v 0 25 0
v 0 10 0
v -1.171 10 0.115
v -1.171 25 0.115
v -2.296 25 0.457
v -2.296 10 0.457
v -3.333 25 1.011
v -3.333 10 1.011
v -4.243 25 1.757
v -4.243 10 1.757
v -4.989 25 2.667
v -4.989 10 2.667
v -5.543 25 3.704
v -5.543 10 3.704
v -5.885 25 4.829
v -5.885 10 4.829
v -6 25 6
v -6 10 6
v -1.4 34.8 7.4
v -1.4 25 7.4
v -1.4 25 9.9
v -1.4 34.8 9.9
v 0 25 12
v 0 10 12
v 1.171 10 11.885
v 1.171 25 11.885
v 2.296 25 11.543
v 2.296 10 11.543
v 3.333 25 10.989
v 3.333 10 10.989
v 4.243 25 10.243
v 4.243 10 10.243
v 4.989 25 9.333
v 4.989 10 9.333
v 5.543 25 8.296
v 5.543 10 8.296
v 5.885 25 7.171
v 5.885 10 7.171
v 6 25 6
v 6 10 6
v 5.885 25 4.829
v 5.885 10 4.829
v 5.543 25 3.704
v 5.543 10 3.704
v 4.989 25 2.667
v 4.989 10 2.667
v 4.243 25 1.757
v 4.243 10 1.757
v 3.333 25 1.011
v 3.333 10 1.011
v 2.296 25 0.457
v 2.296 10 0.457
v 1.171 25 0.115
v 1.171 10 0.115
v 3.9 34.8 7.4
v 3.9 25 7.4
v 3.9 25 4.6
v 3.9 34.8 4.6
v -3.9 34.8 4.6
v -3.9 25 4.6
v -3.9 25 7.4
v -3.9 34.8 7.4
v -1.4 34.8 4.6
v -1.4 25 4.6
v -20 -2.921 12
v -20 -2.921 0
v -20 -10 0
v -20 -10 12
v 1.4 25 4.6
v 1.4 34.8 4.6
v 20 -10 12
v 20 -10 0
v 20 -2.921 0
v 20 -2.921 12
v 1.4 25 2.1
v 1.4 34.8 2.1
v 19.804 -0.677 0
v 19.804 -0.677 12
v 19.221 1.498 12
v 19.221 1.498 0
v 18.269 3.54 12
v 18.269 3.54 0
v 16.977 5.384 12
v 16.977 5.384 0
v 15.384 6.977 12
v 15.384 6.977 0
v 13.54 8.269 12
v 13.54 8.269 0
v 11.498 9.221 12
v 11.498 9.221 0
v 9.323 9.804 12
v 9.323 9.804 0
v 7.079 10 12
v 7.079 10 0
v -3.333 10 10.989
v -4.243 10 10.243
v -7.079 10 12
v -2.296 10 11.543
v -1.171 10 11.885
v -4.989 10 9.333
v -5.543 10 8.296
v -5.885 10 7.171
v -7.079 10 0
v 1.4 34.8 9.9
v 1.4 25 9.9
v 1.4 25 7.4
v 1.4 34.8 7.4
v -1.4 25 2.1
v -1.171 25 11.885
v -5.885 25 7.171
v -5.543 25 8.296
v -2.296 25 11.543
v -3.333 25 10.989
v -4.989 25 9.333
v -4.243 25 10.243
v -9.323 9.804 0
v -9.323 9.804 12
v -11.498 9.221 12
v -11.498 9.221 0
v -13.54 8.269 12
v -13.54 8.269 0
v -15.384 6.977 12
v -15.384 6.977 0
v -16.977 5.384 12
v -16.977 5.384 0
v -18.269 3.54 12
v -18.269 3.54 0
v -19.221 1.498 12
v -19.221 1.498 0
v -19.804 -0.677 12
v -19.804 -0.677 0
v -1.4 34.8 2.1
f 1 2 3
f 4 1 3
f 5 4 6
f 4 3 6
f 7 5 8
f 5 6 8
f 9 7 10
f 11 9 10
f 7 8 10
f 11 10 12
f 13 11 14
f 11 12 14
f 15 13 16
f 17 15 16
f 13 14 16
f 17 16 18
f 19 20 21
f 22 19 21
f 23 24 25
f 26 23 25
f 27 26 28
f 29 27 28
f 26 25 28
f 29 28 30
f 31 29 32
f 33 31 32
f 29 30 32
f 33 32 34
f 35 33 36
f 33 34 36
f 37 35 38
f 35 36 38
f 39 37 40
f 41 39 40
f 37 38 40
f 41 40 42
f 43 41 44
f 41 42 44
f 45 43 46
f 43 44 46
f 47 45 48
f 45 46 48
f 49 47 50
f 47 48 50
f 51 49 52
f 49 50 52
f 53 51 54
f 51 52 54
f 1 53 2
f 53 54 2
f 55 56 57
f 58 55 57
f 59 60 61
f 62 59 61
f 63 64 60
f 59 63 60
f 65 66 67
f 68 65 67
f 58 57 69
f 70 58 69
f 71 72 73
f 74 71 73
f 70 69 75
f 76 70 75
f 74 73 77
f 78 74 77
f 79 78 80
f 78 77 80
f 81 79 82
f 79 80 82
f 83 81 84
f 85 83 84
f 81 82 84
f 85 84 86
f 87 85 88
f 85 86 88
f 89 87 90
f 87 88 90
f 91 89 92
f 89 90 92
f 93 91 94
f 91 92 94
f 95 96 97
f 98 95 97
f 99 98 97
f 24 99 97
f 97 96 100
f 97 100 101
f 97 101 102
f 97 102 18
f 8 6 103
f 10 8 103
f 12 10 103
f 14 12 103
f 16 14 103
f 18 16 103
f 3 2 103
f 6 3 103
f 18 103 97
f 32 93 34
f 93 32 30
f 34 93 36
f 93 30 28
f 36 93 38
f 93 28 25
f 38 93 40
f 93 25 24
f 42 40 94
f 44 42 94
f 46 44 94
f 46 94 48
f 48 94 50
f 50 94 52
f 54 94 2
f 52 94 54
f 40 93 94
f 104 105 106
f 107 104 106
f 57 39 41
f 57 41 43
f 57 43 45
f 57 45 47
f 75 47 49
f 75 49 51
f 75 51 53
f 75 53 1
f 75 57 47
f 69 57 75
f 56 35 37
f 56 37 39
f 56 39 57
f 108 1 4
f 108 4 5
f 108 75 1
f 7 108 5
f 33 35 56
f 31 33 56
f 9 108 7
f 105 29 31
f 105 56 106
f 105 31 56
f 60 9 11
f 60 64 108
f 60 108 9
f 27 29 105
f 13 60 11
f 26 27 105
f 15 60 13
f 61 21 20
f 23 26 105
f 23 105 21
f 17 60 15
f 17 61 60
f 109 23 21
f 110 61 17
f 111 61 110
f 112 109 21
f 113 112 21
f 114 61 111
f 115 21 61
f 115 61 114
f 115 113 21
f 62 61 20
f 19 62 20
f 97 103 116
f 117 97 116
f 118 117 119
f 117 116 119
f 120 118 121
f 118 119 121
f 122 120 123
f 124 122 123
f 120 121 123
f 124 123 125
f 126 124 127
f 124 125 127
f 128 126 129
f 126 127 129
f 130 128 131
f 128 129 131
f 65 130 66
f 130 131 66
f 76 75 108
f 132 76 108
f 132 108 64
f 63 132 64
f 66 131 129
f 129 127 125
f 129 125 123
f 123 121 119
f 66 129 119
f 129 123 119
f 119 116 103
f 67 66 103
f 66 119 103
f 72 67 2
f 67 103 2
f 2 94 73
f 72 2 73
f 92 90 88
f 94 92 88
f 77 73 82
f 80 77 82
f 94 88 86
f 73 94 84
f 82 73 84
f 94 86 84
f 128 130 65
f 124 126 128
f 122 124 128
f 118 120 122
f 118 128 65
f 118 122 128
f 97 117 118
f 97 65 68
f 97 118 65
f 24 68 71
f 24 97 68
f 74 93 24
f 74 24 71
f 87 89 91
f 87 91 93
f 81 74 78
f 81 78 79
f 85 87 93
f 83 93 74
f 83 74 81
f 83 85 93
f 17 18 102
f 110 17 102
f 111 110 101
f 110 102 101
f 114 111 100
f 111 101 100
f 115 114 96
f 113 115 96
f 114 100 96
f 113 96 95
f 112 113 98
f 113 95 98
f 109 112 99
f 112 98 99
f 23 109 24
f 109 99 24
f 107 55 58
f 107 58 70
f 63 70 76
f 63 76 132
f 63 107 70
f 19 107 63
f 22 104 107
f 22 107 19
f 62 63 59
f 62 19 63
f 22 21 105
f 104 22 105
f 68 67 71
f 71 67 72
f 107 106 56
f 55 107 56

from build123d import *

# Parameters (mm, degrees)
F1_DEPTH = 12
F3_DEPTH = 15
F5_DEPTH = 9.8


with BuildPart() as f1:
    # F0 (on Top) → F1 (new body)
    with BuildSketch(Plane.XY):
        with BuildLine():
            Line((-20, -10), (-7.079002, -10))
            Line((-7.079002, -10), (7.079002, -10))
            Line((7.079002, -10), (20, -10))
            Line((20, -10), (20, -2.920998))
            ThreePointArc((20, -2.920998), (16.215527, 6.215527), (7.079002, 10))
            Line((7.079002, 10), (-7.079002, 10))
            ThreePointArc((-7.079002, 10), (-16.215527, 6.215527), (-20, -2.920998))
            Line((-20, -2.920998), (-20, -10))
        make_face()
    extrude(amount=F1_DEPTH)

    # F2 (on face) → F3 (join)
    with BuildSketch(Plane(origin=(0, 10, 0), x_dir=(-1, 0, 0), z_dir=(0, 1, 0))):
        with BuildLine():
            ThreePointArc((0, 0), (4.242641, 1.757359), (6, 6))
            ThreePointArc((6, 6), (4.242641, 10.242641), (0, 12))
            ThreePointArc((0, 12), (-6, 6), (0, 0))
        make_face()
    extrude(amount=F3_DEPTH)

    # F4 (on face) → F5 (join)
    with BuildSketch(Plane(origin=(0, 25, 0), x_dir=(-1, 0, 0), z_dir=(0, 1, 0))):
        Polygon((-3.9, 7.4), (-3.9, 4.6), (-1.4, 4.6), (-1.4, 2.1), (1.4, 2.1), (1.4, 4.6), (3.9, 4.6), (3.9, 7.4), (1.4, 7.4), (1.4, 9.9), (-1.4, 9.9), (-1.4, 7.4), align=None)
    extrude(amount=F5_DEPTH)


solid = f1.part
